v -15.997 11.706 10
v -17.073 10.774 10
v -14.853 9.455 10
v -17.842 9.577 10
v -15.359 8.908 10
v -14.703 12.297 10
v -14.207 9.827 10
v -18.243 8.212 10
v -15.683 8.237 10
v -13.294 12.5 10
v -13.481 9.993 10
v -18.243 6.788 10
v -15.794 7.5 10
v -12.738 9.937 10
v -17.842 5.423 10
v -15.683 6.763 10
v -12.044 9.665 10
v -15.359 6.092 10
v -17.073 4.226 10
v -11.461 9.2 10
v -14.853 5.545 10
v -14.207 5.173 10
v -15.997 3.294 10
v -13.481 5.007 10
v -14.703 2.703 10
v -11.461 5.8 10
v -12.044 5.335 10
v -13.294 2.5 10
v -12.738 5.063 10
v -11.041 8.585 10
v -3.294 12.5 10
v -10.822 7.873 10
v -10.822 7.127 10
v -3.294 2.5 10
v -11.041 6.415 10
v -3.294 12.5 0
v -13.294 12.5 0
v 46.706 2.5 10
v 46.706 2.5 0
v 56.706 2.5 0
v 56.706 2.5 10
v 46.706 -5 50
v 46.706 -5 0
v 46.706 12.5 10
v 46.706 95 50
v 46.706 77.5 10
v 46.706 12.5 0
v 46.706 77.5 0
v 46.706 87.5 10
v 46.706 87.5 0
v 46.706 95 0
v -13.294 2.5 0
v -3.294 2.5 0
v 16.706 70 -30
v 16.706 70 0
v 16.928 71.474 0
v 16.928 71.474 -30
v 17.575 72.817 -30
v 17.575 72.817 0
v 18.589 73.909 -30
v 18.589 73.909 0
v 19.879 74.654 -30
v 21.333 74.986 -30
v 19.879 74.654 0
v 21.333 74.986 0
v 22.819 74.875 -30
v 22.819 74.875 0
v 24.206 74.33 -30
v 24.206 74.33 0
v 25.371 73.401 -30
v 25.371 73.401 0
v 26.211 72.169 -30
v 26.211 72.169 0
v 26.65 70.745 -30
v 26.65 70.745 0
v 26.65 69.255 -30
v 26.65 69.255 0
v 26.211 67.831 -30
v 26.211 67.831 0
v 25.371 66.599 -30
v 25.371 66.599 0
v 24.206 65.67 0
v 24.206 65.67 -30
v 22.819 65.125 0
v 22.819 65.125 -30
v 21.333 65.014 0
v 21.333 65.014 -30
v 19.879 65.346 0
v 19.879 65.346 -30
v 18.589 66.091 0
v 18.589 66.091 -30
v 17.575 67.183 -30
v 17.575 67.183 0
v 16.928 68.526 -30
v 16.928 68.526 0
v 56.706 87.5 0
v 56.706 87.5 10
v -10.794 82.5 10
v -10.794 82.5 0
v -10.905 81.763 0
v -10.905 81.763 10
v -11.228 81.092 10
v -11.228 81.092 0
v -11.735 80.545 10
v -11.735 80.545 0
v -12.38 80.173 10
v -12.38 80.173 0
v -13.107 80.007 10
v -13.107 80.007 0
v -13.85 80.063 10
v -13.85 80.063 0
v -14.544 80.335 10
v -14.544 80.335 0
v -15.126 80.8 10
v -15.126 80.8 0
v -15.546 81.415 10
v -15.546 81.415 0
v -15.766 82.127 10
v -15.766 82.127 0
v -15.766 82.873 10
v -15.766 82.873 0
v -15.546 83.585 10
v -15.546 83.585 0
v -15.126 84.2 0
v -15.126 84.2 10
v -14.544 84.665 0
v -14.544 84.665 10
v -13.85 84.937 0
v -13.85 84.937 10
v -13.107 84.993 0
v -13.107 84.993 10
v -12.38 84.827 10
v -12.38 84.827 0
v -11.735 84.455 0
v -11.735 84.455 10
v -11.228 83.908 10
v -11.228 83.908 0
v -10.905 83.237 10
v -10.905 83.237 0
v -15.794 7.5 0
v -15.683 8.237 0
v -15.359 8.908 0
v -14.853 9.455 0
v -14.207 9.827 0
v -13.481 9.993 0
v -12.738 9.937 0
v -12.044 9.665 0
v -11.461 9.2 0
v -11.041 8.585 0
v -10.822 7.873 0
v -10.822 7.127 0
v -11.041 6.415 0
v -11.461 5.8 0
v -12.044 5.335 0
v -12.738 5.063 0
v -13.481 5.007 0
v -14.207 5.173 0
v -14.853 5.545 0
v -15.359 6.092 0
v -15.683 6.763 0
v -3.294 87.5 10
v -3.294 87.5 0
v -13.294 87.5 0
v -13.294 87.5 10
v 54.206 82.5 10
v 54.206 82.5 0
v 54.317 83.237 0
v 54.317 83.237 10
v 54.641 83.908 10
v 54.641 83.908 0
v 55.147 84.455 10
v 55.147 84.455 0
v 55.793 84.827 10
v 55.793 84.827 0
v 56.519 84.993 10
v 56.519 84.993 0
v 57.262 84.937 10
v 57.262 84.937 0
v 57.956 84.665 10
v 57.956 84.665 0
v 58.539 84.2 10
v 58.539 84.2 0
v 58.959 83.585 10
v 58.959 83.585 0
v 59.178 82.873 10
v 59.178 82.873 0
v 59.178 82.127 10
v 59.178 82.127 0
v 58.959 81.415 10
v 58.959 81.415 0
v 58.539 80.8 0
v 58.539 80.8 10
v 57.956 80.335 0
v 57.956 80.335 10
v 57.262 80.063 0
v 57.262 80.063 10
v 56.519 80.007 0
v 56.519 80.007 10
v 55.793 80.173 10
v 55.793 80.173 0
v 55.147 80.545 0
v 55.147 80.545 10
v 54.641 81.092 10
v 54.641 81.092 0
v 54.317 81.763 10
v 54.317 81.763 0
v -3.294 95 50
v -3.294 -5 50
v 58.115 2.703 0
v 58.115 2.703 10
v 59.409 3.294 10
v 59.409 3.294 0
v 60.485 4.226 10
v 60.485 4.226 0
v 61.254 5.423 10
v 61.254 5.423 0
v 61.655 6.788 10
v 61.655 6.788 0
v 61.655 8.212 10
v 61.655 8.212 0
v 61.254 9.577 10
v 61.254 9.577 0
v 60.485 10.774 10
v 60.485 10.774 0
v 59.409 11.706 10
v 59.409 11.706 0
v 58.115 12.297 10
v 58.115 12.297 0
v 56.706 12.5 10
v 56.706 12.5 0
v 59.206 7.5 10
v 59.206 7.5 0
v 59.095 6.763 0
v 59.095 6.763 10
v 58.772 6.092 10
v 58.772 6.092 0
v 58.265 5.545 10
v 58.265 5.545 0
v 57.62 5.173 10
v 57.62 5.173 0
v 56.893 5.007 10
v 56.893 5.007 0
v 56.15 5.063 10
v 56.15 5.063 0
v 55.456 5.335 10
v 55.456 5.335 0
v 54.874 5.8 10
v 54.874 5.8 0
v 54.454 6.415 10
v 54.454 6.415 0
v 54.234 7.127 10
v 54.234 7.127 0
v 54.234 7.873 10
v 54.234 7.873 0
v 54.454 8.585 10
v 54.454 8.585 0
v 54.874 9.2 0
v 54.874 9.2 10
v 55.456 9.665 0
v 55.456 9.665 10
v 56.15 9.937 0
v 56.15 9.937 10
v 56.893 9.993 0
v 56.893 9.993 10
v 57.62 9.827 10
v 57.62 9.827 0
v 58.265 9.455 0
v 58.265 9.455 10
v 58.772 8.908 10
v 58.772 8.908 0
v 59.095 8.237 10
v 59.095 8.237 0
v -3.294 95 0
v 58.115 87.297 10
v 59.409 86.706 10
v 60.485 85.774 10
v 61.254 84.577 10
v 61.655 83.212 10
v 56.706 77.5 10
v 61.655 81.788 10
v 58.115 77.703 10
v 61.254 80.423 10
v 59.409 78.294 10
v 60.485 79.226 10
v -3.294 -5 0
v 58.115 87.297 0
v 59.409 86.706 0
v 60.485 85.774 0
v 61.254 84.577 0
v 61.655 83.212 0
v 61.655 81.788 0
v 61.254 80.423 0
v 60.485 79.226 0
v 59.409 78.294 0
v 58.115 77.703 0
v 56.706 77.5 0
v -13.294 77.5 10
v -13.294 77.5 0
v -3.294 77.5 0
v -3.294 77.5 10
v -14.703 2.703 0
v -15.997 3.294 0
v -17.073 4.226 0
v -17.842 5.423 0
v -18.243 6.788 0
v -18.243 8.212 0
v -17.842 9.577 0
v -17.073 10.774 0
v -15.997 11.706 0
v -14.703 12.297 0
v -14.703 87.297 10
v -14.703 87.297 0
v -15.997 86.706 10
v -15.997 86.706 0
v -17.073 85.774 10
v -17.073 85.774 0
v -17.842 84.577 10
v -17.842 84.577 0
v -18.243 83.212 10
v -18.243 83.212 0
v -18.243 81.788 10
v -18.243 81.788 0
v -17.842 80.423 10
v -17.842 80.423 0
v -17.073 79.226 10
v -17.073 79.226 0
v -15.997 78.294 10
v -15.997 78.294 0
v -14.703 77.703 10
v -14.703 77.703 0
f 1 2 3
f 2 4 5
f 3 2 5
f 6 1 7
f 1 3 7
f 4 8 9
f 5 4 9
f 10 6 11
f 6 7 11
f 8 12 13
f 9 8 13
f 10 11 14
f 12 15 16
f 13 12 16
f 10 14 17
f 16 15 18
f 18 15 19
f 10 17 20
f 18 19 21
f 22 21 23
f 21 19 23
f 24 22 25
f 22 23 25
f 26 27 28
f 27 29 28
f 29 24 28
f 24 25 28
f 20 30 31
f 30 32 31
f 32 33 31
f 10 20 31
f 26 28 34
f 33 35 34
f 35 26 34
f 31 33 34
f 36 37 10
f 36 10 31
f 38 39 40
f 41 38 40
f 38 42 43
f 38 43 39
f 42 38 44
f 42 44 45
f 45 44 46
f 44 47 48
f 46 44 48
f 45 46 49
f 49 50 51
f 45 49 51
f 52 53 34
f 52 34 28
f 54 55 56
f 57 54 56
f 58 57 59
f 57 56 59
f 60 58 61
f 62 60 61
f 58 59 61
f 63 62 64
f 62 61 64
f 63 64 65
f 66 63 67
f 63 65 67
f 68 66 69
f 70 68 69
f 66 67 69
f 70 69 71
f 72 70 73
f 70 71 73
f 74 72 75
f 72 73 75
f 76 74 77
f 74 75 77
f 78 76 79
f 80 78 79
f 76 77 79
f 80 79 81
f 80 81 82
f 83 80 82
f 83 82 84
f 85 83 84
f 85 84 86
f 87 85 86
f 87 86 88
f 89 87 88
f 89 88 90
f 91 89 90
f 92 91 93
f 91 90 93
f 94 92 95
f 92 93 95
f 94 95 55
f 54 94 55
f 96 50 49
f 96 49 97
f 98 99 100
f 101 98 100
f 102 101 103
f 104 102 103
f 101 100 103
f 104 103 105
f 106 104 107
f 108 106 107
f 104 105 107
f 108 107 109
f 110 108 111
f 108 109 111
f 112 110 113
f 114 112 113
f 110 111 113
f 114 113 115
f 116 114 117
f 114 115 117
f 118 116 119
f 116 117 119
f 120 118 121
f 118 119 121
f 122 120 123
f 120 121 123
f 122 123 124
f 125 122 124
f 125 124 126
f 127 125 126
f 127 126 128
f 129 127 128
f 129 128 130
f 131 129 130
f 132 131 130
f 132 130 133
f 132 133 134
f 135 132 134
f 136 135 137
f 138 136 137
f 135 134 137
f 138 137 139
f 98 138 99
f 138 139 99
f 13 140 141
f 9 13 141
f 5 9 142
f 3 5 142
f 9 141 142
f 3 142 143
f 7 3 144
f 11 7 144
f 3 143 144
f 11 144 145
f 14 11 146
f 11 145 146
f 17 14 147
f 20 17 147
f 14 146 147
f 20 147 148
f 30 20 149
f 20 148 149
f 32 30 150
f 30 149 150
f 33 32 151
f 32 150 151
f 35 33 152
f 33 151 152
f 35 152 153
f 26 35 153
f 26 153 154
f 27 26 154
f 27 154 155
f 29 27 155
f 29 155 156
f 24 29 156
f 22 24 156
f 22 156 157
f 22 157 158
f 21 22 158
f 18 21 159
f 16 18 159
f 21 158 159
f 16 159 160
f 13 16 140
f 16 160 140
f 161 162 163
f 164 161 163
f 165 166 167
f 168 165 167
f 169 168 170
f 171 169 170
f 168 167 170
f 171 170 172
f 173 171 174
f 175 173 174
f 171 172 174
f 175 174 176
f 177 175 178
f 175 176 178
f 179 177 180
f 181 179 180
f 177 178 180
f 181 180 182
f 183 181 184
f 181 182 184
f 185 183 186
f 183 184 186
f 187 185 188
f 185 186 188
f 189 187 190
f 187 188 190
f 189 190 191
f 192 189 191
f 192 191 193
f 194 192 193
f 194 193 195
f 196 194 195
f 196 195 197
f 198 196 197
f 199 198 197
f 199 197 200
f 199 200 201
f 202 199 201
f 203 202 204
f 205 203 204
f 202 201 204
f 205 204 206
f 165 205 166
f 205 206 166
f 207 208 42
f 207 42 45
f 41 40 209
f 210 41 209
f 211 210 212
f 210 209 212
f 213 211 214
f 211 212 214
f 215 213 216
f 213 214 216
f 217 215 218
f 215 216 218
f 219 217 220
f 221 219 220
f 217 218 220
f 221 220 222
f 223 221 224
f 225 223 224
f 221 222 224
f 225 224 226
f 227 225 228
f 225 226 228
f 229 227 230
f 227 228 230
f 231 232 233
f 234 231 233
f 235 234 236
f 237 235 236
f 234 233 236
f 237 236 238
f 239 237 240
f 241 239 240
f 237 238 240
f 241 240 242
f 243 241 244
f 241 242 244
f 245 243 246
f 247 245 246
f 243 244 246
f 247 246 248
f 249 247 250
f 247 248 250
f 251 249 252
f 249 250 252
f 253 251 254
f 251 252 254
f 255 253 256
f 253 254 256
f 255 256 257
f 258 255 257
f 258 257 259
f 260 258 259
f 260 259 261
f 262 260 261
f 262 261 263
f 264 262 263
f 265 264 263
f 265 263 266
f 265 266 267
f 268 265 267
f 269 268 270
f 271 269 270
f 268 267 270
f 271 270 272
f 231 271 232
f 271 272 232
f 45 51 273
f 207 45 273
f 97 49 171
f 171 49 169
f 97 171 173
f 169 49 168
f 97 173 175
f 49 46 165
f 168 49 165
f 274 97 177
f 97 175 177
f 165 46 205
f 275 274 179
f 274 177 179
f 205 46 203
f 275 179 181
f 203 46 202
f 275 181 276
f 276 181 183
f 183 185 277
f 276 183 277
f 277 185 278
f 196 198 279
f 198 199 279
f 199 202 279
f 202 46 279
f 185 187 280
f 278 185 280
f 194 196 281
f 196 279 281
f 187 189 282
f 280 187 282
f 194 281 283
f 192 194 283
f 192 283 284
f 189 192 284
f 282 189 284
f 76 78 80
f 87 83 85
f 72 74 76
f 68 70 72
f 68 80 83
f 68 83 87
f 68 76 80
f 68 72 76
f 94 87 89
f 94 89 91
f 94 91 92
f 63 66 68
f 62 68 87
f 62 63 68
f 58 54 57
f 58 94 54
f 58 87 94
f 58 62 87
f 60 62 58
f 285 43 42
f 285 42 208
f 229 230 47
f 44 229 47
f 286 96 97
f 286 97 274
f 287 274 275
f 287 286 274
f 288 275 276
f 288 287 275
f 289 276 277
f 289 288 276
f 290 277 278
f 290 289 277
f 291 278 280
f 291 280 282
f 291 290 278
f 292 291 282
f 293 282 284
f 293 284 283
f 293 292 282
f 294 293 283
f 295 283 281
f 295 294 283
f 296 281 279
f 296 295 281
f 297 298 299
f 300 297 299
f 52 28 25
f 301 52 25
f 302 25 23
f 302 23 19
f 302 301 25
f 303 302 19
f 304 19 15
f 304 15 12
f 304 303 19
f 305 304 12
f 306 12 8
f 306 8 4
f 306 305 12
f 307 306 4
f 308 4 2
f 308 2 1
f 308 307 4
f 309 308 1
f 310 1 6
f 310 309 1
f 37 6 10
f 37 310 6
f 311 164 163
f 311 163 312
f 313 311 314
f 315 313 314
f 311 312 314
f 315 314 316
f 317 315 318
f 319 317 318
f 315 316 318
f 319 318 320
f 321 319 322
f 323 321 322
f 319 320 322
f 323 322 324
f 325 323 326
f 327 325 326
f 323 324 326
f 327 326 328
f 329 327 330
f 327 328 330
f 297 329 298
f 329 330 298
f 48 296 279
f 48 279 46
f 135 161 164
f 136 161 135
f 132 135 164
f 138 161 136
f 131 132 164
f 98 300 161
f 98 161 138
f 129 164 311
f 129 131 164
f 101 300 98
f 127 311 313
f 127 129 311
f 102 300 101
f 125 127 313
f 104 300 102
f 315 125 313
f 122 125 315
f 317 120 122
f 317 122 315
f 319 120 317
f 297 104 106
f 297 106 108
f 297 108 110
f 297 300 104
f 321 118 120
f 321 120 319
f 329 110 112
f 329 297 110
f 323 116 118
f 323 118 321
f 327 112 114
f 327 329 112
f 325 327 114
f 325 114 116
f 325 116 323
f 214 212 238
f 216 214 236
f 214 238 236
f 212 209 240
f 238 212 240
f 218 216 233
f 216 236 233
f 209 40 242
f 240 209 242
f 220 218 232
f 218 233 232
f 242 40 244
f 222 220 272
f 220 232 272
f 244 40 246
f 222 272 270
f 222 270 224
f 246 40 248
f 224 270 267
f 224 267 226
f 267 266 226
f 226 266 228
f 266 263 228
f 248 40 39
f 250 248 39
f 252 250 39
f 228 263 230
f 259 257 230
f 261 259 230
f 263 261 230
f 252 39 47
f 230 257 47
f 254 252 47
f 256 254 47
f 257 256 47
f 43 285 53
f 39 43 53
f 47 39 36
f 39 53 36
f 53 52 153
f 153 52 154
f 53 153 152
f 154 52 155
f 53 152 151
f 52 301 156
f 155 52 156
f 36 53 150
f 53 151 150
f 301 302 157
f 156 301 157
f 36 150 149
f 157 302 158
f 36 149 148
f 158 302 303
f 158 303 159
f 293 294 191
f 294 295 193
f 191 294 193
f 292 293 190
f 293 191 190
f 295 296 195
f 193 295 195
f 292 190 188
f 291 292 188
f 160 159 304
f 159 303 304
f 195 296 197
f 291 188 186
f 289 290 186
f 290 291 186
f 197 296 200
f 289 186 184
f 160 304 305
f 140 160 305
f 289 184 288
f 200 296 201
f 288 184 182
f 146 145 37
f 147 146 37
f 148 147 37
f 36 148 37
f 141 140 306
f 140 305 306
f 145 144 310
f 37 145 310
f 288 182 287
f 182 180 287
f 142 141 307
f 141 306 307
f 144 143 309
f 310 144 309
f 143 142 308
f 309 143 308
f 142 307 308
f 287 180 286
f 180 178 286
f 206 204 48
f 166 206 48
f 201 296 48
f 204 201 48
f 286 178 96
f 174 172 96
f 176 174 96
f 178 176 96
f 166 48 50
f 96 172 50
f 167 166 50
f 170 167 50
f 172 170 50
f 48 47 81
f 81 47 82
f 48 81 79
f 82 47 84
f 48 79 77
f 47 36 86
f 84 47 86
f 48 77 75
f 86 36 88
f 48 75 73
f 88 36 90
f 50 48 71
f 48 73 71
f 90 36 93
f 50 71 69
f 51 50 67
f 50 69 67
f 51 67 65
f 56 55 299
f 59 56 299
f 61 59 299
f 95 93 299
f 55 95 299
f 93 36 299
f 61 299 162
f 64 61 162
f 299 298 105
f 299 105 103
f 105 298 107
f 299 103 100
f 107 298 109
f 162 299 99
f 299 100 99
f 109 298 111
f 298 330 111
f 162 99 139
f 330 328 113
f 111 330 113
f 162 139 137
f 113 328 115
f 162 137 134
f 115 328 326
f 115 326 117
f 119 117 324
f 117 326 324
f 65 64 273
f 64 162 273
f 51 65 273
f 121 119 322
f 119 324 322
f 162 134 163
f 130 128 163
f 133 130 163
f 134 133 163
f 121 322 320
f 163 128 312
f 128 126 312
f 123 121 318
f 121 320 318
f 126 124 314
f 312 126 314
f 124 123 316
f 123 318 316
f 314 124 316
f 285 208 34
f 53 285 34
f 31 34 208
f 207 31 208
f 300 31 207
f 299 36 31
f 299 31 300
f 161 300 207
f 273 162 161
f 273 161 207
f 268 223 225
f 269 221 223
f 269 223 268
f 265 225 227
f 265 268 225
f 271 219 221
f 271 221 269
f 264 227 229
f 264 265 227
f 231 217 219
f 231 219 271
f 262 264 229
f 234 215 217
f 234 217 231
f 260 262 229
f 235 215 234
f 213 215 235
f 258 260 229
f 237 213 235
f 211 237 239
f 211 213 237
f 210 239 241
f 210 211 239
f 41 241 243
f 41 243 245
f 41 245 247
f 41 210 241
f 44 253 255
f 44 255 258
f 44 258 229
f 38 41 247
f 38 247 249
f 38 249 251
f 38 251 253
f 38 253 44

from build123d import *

# Parameters (mm, degrees)
SKETCH1_W           = 100
SKETCH1_H           = 50
BOSS_EXTRUDE1_DEPTH = 50
SKETCH2_R           = 2.5
BOSS_EXTRUDE2_DEPTH = 10
SKETCH3_R           = 5
BOSS_EXTRUDE3_DEPTH = 30


with BuildPart() as part:
    # Sketch1 → Boss-Extrude1 (new body)
    with BuildSketch(Plane(origin=(0, 0, 0), x_dir=(0, 1, 0), z_dir=(0, 0, 1))):
        with Locations((45, -21.706161137)):
            Rectangle(SKETCH1_W, SKETCH1_H)
    extrude(amount=BOSS_EXTRUDE1_DEPTH)

    # Sketch2 → Boss-Extrude2 (add)
    # profile 1 of 4: a face of its own
    with BuildSketch(Plane(origin=(0, 0, 0), x_dir=(1, 0, 0), z_dir=(0, 0, -1))):
        with BuildLine():
            Line((-3.293838863, -2.5), (-13.293838863, -2.5))
            ThreePointArc((-13.293838863, -2.5), (-18.293838863, -7.5), (-13.293838863, -12.5))
            Line((-13.293838863, -12.5), (-3.293838863, -12.5))
            Line((-3.293838863, -12.5), (-3.293838863, -2.5))
        make_face()
        with Locations(Location((-13.293838863, -7.5, 0), (0, 0, 180))):
            Circle(SKETCH2_R, mode=Mode.SUBTRACT)
    # profile 2 of 4: a face of its own
    with BuildSketch(Plane(origin=(0, 0, 0), x_dir=(1, 0, 0), z_dir=(0, 0, -1))):
        with BuildLine():
            Line((-3.293838863, -77.5), (-3.293838863, -87.5))
            Line((-3.293838863, -87.5), (-13.293838863, -87.5))
            ThreePointArc((-13.293838863, -87.5), (-18.293838863, -82.5), (-13.293838863, -77.5))
            Line((-13.293838863, -77.5), (-3.293838863, -77.5))
        make_face()
        with Locations((-13.293838863, -82.5)):
            Circle(SKETCH2_R, mode=Mode.SUBTRACT)
    # profile 3 of 4: a face of its own
    with BuildSketch(Plane(origin=(0, 0, 0), x_dir=(1, 0, 0), z_dir=(0, 0, -1))):
        with BuildLine():
            Line((46.706161137, -87.5), (56.706161137, -87.5))
            ThreePointArc((56.706161137, -87.5), (61.706161137, -82.5), (56.706161137, -77.5))
            Line((56.706161137, -77.5), (46.706161137, -77.5))
            Line((46.706161137, -77.5), (46.706161137, -87.5))
        make_face()
        with Locations(Location((56.706161137, -82.5, 0), (0, 0, 180))):
            Circle(SKETCH2_R, mode=Mode.SUBTRACT)
    # profile 4 of 4: a face of its own
    with BuildSketch(Plane(origin=(0, 0, 0), x_dir=(1, 0, 0), z_dir=(0, 0, -1))):
        with BuildLine():
            Line((46.706161137, -12.5), (46.706161137, -2.5))
            Line((46.706161137, -2.5), (56.706161137, -2.5))
            ThreePointArc((56.706161137, -2.5), (61.706161137, -7.5), (56.706161137, -12.5))
            Line((56.706161137, -12.5), (46.706161137, -12.5))
        make_face()
        with Locations((56.706161137, -7.5)):
            Circle(SKETCH2_R, mode=Mode.SUBTRACT)
    extrude(amount=-BOSS_EXTRUDE2_DEPTH)

    # Sketch3 → Boss-Extrude3 (add)
    with BuildSketch(Plane(origin=(0, 0, 0), x_dir=(1, 0, 0), z_dir=(0, 0, -1))):
        with Locations(Location((21.706161137, -70, 0), (0, 0, 180))):
            Circle(SKETCH3_R)
    extrude(amount=BOSS_EXTRUDE3_DEPTH)


solid = part.part
